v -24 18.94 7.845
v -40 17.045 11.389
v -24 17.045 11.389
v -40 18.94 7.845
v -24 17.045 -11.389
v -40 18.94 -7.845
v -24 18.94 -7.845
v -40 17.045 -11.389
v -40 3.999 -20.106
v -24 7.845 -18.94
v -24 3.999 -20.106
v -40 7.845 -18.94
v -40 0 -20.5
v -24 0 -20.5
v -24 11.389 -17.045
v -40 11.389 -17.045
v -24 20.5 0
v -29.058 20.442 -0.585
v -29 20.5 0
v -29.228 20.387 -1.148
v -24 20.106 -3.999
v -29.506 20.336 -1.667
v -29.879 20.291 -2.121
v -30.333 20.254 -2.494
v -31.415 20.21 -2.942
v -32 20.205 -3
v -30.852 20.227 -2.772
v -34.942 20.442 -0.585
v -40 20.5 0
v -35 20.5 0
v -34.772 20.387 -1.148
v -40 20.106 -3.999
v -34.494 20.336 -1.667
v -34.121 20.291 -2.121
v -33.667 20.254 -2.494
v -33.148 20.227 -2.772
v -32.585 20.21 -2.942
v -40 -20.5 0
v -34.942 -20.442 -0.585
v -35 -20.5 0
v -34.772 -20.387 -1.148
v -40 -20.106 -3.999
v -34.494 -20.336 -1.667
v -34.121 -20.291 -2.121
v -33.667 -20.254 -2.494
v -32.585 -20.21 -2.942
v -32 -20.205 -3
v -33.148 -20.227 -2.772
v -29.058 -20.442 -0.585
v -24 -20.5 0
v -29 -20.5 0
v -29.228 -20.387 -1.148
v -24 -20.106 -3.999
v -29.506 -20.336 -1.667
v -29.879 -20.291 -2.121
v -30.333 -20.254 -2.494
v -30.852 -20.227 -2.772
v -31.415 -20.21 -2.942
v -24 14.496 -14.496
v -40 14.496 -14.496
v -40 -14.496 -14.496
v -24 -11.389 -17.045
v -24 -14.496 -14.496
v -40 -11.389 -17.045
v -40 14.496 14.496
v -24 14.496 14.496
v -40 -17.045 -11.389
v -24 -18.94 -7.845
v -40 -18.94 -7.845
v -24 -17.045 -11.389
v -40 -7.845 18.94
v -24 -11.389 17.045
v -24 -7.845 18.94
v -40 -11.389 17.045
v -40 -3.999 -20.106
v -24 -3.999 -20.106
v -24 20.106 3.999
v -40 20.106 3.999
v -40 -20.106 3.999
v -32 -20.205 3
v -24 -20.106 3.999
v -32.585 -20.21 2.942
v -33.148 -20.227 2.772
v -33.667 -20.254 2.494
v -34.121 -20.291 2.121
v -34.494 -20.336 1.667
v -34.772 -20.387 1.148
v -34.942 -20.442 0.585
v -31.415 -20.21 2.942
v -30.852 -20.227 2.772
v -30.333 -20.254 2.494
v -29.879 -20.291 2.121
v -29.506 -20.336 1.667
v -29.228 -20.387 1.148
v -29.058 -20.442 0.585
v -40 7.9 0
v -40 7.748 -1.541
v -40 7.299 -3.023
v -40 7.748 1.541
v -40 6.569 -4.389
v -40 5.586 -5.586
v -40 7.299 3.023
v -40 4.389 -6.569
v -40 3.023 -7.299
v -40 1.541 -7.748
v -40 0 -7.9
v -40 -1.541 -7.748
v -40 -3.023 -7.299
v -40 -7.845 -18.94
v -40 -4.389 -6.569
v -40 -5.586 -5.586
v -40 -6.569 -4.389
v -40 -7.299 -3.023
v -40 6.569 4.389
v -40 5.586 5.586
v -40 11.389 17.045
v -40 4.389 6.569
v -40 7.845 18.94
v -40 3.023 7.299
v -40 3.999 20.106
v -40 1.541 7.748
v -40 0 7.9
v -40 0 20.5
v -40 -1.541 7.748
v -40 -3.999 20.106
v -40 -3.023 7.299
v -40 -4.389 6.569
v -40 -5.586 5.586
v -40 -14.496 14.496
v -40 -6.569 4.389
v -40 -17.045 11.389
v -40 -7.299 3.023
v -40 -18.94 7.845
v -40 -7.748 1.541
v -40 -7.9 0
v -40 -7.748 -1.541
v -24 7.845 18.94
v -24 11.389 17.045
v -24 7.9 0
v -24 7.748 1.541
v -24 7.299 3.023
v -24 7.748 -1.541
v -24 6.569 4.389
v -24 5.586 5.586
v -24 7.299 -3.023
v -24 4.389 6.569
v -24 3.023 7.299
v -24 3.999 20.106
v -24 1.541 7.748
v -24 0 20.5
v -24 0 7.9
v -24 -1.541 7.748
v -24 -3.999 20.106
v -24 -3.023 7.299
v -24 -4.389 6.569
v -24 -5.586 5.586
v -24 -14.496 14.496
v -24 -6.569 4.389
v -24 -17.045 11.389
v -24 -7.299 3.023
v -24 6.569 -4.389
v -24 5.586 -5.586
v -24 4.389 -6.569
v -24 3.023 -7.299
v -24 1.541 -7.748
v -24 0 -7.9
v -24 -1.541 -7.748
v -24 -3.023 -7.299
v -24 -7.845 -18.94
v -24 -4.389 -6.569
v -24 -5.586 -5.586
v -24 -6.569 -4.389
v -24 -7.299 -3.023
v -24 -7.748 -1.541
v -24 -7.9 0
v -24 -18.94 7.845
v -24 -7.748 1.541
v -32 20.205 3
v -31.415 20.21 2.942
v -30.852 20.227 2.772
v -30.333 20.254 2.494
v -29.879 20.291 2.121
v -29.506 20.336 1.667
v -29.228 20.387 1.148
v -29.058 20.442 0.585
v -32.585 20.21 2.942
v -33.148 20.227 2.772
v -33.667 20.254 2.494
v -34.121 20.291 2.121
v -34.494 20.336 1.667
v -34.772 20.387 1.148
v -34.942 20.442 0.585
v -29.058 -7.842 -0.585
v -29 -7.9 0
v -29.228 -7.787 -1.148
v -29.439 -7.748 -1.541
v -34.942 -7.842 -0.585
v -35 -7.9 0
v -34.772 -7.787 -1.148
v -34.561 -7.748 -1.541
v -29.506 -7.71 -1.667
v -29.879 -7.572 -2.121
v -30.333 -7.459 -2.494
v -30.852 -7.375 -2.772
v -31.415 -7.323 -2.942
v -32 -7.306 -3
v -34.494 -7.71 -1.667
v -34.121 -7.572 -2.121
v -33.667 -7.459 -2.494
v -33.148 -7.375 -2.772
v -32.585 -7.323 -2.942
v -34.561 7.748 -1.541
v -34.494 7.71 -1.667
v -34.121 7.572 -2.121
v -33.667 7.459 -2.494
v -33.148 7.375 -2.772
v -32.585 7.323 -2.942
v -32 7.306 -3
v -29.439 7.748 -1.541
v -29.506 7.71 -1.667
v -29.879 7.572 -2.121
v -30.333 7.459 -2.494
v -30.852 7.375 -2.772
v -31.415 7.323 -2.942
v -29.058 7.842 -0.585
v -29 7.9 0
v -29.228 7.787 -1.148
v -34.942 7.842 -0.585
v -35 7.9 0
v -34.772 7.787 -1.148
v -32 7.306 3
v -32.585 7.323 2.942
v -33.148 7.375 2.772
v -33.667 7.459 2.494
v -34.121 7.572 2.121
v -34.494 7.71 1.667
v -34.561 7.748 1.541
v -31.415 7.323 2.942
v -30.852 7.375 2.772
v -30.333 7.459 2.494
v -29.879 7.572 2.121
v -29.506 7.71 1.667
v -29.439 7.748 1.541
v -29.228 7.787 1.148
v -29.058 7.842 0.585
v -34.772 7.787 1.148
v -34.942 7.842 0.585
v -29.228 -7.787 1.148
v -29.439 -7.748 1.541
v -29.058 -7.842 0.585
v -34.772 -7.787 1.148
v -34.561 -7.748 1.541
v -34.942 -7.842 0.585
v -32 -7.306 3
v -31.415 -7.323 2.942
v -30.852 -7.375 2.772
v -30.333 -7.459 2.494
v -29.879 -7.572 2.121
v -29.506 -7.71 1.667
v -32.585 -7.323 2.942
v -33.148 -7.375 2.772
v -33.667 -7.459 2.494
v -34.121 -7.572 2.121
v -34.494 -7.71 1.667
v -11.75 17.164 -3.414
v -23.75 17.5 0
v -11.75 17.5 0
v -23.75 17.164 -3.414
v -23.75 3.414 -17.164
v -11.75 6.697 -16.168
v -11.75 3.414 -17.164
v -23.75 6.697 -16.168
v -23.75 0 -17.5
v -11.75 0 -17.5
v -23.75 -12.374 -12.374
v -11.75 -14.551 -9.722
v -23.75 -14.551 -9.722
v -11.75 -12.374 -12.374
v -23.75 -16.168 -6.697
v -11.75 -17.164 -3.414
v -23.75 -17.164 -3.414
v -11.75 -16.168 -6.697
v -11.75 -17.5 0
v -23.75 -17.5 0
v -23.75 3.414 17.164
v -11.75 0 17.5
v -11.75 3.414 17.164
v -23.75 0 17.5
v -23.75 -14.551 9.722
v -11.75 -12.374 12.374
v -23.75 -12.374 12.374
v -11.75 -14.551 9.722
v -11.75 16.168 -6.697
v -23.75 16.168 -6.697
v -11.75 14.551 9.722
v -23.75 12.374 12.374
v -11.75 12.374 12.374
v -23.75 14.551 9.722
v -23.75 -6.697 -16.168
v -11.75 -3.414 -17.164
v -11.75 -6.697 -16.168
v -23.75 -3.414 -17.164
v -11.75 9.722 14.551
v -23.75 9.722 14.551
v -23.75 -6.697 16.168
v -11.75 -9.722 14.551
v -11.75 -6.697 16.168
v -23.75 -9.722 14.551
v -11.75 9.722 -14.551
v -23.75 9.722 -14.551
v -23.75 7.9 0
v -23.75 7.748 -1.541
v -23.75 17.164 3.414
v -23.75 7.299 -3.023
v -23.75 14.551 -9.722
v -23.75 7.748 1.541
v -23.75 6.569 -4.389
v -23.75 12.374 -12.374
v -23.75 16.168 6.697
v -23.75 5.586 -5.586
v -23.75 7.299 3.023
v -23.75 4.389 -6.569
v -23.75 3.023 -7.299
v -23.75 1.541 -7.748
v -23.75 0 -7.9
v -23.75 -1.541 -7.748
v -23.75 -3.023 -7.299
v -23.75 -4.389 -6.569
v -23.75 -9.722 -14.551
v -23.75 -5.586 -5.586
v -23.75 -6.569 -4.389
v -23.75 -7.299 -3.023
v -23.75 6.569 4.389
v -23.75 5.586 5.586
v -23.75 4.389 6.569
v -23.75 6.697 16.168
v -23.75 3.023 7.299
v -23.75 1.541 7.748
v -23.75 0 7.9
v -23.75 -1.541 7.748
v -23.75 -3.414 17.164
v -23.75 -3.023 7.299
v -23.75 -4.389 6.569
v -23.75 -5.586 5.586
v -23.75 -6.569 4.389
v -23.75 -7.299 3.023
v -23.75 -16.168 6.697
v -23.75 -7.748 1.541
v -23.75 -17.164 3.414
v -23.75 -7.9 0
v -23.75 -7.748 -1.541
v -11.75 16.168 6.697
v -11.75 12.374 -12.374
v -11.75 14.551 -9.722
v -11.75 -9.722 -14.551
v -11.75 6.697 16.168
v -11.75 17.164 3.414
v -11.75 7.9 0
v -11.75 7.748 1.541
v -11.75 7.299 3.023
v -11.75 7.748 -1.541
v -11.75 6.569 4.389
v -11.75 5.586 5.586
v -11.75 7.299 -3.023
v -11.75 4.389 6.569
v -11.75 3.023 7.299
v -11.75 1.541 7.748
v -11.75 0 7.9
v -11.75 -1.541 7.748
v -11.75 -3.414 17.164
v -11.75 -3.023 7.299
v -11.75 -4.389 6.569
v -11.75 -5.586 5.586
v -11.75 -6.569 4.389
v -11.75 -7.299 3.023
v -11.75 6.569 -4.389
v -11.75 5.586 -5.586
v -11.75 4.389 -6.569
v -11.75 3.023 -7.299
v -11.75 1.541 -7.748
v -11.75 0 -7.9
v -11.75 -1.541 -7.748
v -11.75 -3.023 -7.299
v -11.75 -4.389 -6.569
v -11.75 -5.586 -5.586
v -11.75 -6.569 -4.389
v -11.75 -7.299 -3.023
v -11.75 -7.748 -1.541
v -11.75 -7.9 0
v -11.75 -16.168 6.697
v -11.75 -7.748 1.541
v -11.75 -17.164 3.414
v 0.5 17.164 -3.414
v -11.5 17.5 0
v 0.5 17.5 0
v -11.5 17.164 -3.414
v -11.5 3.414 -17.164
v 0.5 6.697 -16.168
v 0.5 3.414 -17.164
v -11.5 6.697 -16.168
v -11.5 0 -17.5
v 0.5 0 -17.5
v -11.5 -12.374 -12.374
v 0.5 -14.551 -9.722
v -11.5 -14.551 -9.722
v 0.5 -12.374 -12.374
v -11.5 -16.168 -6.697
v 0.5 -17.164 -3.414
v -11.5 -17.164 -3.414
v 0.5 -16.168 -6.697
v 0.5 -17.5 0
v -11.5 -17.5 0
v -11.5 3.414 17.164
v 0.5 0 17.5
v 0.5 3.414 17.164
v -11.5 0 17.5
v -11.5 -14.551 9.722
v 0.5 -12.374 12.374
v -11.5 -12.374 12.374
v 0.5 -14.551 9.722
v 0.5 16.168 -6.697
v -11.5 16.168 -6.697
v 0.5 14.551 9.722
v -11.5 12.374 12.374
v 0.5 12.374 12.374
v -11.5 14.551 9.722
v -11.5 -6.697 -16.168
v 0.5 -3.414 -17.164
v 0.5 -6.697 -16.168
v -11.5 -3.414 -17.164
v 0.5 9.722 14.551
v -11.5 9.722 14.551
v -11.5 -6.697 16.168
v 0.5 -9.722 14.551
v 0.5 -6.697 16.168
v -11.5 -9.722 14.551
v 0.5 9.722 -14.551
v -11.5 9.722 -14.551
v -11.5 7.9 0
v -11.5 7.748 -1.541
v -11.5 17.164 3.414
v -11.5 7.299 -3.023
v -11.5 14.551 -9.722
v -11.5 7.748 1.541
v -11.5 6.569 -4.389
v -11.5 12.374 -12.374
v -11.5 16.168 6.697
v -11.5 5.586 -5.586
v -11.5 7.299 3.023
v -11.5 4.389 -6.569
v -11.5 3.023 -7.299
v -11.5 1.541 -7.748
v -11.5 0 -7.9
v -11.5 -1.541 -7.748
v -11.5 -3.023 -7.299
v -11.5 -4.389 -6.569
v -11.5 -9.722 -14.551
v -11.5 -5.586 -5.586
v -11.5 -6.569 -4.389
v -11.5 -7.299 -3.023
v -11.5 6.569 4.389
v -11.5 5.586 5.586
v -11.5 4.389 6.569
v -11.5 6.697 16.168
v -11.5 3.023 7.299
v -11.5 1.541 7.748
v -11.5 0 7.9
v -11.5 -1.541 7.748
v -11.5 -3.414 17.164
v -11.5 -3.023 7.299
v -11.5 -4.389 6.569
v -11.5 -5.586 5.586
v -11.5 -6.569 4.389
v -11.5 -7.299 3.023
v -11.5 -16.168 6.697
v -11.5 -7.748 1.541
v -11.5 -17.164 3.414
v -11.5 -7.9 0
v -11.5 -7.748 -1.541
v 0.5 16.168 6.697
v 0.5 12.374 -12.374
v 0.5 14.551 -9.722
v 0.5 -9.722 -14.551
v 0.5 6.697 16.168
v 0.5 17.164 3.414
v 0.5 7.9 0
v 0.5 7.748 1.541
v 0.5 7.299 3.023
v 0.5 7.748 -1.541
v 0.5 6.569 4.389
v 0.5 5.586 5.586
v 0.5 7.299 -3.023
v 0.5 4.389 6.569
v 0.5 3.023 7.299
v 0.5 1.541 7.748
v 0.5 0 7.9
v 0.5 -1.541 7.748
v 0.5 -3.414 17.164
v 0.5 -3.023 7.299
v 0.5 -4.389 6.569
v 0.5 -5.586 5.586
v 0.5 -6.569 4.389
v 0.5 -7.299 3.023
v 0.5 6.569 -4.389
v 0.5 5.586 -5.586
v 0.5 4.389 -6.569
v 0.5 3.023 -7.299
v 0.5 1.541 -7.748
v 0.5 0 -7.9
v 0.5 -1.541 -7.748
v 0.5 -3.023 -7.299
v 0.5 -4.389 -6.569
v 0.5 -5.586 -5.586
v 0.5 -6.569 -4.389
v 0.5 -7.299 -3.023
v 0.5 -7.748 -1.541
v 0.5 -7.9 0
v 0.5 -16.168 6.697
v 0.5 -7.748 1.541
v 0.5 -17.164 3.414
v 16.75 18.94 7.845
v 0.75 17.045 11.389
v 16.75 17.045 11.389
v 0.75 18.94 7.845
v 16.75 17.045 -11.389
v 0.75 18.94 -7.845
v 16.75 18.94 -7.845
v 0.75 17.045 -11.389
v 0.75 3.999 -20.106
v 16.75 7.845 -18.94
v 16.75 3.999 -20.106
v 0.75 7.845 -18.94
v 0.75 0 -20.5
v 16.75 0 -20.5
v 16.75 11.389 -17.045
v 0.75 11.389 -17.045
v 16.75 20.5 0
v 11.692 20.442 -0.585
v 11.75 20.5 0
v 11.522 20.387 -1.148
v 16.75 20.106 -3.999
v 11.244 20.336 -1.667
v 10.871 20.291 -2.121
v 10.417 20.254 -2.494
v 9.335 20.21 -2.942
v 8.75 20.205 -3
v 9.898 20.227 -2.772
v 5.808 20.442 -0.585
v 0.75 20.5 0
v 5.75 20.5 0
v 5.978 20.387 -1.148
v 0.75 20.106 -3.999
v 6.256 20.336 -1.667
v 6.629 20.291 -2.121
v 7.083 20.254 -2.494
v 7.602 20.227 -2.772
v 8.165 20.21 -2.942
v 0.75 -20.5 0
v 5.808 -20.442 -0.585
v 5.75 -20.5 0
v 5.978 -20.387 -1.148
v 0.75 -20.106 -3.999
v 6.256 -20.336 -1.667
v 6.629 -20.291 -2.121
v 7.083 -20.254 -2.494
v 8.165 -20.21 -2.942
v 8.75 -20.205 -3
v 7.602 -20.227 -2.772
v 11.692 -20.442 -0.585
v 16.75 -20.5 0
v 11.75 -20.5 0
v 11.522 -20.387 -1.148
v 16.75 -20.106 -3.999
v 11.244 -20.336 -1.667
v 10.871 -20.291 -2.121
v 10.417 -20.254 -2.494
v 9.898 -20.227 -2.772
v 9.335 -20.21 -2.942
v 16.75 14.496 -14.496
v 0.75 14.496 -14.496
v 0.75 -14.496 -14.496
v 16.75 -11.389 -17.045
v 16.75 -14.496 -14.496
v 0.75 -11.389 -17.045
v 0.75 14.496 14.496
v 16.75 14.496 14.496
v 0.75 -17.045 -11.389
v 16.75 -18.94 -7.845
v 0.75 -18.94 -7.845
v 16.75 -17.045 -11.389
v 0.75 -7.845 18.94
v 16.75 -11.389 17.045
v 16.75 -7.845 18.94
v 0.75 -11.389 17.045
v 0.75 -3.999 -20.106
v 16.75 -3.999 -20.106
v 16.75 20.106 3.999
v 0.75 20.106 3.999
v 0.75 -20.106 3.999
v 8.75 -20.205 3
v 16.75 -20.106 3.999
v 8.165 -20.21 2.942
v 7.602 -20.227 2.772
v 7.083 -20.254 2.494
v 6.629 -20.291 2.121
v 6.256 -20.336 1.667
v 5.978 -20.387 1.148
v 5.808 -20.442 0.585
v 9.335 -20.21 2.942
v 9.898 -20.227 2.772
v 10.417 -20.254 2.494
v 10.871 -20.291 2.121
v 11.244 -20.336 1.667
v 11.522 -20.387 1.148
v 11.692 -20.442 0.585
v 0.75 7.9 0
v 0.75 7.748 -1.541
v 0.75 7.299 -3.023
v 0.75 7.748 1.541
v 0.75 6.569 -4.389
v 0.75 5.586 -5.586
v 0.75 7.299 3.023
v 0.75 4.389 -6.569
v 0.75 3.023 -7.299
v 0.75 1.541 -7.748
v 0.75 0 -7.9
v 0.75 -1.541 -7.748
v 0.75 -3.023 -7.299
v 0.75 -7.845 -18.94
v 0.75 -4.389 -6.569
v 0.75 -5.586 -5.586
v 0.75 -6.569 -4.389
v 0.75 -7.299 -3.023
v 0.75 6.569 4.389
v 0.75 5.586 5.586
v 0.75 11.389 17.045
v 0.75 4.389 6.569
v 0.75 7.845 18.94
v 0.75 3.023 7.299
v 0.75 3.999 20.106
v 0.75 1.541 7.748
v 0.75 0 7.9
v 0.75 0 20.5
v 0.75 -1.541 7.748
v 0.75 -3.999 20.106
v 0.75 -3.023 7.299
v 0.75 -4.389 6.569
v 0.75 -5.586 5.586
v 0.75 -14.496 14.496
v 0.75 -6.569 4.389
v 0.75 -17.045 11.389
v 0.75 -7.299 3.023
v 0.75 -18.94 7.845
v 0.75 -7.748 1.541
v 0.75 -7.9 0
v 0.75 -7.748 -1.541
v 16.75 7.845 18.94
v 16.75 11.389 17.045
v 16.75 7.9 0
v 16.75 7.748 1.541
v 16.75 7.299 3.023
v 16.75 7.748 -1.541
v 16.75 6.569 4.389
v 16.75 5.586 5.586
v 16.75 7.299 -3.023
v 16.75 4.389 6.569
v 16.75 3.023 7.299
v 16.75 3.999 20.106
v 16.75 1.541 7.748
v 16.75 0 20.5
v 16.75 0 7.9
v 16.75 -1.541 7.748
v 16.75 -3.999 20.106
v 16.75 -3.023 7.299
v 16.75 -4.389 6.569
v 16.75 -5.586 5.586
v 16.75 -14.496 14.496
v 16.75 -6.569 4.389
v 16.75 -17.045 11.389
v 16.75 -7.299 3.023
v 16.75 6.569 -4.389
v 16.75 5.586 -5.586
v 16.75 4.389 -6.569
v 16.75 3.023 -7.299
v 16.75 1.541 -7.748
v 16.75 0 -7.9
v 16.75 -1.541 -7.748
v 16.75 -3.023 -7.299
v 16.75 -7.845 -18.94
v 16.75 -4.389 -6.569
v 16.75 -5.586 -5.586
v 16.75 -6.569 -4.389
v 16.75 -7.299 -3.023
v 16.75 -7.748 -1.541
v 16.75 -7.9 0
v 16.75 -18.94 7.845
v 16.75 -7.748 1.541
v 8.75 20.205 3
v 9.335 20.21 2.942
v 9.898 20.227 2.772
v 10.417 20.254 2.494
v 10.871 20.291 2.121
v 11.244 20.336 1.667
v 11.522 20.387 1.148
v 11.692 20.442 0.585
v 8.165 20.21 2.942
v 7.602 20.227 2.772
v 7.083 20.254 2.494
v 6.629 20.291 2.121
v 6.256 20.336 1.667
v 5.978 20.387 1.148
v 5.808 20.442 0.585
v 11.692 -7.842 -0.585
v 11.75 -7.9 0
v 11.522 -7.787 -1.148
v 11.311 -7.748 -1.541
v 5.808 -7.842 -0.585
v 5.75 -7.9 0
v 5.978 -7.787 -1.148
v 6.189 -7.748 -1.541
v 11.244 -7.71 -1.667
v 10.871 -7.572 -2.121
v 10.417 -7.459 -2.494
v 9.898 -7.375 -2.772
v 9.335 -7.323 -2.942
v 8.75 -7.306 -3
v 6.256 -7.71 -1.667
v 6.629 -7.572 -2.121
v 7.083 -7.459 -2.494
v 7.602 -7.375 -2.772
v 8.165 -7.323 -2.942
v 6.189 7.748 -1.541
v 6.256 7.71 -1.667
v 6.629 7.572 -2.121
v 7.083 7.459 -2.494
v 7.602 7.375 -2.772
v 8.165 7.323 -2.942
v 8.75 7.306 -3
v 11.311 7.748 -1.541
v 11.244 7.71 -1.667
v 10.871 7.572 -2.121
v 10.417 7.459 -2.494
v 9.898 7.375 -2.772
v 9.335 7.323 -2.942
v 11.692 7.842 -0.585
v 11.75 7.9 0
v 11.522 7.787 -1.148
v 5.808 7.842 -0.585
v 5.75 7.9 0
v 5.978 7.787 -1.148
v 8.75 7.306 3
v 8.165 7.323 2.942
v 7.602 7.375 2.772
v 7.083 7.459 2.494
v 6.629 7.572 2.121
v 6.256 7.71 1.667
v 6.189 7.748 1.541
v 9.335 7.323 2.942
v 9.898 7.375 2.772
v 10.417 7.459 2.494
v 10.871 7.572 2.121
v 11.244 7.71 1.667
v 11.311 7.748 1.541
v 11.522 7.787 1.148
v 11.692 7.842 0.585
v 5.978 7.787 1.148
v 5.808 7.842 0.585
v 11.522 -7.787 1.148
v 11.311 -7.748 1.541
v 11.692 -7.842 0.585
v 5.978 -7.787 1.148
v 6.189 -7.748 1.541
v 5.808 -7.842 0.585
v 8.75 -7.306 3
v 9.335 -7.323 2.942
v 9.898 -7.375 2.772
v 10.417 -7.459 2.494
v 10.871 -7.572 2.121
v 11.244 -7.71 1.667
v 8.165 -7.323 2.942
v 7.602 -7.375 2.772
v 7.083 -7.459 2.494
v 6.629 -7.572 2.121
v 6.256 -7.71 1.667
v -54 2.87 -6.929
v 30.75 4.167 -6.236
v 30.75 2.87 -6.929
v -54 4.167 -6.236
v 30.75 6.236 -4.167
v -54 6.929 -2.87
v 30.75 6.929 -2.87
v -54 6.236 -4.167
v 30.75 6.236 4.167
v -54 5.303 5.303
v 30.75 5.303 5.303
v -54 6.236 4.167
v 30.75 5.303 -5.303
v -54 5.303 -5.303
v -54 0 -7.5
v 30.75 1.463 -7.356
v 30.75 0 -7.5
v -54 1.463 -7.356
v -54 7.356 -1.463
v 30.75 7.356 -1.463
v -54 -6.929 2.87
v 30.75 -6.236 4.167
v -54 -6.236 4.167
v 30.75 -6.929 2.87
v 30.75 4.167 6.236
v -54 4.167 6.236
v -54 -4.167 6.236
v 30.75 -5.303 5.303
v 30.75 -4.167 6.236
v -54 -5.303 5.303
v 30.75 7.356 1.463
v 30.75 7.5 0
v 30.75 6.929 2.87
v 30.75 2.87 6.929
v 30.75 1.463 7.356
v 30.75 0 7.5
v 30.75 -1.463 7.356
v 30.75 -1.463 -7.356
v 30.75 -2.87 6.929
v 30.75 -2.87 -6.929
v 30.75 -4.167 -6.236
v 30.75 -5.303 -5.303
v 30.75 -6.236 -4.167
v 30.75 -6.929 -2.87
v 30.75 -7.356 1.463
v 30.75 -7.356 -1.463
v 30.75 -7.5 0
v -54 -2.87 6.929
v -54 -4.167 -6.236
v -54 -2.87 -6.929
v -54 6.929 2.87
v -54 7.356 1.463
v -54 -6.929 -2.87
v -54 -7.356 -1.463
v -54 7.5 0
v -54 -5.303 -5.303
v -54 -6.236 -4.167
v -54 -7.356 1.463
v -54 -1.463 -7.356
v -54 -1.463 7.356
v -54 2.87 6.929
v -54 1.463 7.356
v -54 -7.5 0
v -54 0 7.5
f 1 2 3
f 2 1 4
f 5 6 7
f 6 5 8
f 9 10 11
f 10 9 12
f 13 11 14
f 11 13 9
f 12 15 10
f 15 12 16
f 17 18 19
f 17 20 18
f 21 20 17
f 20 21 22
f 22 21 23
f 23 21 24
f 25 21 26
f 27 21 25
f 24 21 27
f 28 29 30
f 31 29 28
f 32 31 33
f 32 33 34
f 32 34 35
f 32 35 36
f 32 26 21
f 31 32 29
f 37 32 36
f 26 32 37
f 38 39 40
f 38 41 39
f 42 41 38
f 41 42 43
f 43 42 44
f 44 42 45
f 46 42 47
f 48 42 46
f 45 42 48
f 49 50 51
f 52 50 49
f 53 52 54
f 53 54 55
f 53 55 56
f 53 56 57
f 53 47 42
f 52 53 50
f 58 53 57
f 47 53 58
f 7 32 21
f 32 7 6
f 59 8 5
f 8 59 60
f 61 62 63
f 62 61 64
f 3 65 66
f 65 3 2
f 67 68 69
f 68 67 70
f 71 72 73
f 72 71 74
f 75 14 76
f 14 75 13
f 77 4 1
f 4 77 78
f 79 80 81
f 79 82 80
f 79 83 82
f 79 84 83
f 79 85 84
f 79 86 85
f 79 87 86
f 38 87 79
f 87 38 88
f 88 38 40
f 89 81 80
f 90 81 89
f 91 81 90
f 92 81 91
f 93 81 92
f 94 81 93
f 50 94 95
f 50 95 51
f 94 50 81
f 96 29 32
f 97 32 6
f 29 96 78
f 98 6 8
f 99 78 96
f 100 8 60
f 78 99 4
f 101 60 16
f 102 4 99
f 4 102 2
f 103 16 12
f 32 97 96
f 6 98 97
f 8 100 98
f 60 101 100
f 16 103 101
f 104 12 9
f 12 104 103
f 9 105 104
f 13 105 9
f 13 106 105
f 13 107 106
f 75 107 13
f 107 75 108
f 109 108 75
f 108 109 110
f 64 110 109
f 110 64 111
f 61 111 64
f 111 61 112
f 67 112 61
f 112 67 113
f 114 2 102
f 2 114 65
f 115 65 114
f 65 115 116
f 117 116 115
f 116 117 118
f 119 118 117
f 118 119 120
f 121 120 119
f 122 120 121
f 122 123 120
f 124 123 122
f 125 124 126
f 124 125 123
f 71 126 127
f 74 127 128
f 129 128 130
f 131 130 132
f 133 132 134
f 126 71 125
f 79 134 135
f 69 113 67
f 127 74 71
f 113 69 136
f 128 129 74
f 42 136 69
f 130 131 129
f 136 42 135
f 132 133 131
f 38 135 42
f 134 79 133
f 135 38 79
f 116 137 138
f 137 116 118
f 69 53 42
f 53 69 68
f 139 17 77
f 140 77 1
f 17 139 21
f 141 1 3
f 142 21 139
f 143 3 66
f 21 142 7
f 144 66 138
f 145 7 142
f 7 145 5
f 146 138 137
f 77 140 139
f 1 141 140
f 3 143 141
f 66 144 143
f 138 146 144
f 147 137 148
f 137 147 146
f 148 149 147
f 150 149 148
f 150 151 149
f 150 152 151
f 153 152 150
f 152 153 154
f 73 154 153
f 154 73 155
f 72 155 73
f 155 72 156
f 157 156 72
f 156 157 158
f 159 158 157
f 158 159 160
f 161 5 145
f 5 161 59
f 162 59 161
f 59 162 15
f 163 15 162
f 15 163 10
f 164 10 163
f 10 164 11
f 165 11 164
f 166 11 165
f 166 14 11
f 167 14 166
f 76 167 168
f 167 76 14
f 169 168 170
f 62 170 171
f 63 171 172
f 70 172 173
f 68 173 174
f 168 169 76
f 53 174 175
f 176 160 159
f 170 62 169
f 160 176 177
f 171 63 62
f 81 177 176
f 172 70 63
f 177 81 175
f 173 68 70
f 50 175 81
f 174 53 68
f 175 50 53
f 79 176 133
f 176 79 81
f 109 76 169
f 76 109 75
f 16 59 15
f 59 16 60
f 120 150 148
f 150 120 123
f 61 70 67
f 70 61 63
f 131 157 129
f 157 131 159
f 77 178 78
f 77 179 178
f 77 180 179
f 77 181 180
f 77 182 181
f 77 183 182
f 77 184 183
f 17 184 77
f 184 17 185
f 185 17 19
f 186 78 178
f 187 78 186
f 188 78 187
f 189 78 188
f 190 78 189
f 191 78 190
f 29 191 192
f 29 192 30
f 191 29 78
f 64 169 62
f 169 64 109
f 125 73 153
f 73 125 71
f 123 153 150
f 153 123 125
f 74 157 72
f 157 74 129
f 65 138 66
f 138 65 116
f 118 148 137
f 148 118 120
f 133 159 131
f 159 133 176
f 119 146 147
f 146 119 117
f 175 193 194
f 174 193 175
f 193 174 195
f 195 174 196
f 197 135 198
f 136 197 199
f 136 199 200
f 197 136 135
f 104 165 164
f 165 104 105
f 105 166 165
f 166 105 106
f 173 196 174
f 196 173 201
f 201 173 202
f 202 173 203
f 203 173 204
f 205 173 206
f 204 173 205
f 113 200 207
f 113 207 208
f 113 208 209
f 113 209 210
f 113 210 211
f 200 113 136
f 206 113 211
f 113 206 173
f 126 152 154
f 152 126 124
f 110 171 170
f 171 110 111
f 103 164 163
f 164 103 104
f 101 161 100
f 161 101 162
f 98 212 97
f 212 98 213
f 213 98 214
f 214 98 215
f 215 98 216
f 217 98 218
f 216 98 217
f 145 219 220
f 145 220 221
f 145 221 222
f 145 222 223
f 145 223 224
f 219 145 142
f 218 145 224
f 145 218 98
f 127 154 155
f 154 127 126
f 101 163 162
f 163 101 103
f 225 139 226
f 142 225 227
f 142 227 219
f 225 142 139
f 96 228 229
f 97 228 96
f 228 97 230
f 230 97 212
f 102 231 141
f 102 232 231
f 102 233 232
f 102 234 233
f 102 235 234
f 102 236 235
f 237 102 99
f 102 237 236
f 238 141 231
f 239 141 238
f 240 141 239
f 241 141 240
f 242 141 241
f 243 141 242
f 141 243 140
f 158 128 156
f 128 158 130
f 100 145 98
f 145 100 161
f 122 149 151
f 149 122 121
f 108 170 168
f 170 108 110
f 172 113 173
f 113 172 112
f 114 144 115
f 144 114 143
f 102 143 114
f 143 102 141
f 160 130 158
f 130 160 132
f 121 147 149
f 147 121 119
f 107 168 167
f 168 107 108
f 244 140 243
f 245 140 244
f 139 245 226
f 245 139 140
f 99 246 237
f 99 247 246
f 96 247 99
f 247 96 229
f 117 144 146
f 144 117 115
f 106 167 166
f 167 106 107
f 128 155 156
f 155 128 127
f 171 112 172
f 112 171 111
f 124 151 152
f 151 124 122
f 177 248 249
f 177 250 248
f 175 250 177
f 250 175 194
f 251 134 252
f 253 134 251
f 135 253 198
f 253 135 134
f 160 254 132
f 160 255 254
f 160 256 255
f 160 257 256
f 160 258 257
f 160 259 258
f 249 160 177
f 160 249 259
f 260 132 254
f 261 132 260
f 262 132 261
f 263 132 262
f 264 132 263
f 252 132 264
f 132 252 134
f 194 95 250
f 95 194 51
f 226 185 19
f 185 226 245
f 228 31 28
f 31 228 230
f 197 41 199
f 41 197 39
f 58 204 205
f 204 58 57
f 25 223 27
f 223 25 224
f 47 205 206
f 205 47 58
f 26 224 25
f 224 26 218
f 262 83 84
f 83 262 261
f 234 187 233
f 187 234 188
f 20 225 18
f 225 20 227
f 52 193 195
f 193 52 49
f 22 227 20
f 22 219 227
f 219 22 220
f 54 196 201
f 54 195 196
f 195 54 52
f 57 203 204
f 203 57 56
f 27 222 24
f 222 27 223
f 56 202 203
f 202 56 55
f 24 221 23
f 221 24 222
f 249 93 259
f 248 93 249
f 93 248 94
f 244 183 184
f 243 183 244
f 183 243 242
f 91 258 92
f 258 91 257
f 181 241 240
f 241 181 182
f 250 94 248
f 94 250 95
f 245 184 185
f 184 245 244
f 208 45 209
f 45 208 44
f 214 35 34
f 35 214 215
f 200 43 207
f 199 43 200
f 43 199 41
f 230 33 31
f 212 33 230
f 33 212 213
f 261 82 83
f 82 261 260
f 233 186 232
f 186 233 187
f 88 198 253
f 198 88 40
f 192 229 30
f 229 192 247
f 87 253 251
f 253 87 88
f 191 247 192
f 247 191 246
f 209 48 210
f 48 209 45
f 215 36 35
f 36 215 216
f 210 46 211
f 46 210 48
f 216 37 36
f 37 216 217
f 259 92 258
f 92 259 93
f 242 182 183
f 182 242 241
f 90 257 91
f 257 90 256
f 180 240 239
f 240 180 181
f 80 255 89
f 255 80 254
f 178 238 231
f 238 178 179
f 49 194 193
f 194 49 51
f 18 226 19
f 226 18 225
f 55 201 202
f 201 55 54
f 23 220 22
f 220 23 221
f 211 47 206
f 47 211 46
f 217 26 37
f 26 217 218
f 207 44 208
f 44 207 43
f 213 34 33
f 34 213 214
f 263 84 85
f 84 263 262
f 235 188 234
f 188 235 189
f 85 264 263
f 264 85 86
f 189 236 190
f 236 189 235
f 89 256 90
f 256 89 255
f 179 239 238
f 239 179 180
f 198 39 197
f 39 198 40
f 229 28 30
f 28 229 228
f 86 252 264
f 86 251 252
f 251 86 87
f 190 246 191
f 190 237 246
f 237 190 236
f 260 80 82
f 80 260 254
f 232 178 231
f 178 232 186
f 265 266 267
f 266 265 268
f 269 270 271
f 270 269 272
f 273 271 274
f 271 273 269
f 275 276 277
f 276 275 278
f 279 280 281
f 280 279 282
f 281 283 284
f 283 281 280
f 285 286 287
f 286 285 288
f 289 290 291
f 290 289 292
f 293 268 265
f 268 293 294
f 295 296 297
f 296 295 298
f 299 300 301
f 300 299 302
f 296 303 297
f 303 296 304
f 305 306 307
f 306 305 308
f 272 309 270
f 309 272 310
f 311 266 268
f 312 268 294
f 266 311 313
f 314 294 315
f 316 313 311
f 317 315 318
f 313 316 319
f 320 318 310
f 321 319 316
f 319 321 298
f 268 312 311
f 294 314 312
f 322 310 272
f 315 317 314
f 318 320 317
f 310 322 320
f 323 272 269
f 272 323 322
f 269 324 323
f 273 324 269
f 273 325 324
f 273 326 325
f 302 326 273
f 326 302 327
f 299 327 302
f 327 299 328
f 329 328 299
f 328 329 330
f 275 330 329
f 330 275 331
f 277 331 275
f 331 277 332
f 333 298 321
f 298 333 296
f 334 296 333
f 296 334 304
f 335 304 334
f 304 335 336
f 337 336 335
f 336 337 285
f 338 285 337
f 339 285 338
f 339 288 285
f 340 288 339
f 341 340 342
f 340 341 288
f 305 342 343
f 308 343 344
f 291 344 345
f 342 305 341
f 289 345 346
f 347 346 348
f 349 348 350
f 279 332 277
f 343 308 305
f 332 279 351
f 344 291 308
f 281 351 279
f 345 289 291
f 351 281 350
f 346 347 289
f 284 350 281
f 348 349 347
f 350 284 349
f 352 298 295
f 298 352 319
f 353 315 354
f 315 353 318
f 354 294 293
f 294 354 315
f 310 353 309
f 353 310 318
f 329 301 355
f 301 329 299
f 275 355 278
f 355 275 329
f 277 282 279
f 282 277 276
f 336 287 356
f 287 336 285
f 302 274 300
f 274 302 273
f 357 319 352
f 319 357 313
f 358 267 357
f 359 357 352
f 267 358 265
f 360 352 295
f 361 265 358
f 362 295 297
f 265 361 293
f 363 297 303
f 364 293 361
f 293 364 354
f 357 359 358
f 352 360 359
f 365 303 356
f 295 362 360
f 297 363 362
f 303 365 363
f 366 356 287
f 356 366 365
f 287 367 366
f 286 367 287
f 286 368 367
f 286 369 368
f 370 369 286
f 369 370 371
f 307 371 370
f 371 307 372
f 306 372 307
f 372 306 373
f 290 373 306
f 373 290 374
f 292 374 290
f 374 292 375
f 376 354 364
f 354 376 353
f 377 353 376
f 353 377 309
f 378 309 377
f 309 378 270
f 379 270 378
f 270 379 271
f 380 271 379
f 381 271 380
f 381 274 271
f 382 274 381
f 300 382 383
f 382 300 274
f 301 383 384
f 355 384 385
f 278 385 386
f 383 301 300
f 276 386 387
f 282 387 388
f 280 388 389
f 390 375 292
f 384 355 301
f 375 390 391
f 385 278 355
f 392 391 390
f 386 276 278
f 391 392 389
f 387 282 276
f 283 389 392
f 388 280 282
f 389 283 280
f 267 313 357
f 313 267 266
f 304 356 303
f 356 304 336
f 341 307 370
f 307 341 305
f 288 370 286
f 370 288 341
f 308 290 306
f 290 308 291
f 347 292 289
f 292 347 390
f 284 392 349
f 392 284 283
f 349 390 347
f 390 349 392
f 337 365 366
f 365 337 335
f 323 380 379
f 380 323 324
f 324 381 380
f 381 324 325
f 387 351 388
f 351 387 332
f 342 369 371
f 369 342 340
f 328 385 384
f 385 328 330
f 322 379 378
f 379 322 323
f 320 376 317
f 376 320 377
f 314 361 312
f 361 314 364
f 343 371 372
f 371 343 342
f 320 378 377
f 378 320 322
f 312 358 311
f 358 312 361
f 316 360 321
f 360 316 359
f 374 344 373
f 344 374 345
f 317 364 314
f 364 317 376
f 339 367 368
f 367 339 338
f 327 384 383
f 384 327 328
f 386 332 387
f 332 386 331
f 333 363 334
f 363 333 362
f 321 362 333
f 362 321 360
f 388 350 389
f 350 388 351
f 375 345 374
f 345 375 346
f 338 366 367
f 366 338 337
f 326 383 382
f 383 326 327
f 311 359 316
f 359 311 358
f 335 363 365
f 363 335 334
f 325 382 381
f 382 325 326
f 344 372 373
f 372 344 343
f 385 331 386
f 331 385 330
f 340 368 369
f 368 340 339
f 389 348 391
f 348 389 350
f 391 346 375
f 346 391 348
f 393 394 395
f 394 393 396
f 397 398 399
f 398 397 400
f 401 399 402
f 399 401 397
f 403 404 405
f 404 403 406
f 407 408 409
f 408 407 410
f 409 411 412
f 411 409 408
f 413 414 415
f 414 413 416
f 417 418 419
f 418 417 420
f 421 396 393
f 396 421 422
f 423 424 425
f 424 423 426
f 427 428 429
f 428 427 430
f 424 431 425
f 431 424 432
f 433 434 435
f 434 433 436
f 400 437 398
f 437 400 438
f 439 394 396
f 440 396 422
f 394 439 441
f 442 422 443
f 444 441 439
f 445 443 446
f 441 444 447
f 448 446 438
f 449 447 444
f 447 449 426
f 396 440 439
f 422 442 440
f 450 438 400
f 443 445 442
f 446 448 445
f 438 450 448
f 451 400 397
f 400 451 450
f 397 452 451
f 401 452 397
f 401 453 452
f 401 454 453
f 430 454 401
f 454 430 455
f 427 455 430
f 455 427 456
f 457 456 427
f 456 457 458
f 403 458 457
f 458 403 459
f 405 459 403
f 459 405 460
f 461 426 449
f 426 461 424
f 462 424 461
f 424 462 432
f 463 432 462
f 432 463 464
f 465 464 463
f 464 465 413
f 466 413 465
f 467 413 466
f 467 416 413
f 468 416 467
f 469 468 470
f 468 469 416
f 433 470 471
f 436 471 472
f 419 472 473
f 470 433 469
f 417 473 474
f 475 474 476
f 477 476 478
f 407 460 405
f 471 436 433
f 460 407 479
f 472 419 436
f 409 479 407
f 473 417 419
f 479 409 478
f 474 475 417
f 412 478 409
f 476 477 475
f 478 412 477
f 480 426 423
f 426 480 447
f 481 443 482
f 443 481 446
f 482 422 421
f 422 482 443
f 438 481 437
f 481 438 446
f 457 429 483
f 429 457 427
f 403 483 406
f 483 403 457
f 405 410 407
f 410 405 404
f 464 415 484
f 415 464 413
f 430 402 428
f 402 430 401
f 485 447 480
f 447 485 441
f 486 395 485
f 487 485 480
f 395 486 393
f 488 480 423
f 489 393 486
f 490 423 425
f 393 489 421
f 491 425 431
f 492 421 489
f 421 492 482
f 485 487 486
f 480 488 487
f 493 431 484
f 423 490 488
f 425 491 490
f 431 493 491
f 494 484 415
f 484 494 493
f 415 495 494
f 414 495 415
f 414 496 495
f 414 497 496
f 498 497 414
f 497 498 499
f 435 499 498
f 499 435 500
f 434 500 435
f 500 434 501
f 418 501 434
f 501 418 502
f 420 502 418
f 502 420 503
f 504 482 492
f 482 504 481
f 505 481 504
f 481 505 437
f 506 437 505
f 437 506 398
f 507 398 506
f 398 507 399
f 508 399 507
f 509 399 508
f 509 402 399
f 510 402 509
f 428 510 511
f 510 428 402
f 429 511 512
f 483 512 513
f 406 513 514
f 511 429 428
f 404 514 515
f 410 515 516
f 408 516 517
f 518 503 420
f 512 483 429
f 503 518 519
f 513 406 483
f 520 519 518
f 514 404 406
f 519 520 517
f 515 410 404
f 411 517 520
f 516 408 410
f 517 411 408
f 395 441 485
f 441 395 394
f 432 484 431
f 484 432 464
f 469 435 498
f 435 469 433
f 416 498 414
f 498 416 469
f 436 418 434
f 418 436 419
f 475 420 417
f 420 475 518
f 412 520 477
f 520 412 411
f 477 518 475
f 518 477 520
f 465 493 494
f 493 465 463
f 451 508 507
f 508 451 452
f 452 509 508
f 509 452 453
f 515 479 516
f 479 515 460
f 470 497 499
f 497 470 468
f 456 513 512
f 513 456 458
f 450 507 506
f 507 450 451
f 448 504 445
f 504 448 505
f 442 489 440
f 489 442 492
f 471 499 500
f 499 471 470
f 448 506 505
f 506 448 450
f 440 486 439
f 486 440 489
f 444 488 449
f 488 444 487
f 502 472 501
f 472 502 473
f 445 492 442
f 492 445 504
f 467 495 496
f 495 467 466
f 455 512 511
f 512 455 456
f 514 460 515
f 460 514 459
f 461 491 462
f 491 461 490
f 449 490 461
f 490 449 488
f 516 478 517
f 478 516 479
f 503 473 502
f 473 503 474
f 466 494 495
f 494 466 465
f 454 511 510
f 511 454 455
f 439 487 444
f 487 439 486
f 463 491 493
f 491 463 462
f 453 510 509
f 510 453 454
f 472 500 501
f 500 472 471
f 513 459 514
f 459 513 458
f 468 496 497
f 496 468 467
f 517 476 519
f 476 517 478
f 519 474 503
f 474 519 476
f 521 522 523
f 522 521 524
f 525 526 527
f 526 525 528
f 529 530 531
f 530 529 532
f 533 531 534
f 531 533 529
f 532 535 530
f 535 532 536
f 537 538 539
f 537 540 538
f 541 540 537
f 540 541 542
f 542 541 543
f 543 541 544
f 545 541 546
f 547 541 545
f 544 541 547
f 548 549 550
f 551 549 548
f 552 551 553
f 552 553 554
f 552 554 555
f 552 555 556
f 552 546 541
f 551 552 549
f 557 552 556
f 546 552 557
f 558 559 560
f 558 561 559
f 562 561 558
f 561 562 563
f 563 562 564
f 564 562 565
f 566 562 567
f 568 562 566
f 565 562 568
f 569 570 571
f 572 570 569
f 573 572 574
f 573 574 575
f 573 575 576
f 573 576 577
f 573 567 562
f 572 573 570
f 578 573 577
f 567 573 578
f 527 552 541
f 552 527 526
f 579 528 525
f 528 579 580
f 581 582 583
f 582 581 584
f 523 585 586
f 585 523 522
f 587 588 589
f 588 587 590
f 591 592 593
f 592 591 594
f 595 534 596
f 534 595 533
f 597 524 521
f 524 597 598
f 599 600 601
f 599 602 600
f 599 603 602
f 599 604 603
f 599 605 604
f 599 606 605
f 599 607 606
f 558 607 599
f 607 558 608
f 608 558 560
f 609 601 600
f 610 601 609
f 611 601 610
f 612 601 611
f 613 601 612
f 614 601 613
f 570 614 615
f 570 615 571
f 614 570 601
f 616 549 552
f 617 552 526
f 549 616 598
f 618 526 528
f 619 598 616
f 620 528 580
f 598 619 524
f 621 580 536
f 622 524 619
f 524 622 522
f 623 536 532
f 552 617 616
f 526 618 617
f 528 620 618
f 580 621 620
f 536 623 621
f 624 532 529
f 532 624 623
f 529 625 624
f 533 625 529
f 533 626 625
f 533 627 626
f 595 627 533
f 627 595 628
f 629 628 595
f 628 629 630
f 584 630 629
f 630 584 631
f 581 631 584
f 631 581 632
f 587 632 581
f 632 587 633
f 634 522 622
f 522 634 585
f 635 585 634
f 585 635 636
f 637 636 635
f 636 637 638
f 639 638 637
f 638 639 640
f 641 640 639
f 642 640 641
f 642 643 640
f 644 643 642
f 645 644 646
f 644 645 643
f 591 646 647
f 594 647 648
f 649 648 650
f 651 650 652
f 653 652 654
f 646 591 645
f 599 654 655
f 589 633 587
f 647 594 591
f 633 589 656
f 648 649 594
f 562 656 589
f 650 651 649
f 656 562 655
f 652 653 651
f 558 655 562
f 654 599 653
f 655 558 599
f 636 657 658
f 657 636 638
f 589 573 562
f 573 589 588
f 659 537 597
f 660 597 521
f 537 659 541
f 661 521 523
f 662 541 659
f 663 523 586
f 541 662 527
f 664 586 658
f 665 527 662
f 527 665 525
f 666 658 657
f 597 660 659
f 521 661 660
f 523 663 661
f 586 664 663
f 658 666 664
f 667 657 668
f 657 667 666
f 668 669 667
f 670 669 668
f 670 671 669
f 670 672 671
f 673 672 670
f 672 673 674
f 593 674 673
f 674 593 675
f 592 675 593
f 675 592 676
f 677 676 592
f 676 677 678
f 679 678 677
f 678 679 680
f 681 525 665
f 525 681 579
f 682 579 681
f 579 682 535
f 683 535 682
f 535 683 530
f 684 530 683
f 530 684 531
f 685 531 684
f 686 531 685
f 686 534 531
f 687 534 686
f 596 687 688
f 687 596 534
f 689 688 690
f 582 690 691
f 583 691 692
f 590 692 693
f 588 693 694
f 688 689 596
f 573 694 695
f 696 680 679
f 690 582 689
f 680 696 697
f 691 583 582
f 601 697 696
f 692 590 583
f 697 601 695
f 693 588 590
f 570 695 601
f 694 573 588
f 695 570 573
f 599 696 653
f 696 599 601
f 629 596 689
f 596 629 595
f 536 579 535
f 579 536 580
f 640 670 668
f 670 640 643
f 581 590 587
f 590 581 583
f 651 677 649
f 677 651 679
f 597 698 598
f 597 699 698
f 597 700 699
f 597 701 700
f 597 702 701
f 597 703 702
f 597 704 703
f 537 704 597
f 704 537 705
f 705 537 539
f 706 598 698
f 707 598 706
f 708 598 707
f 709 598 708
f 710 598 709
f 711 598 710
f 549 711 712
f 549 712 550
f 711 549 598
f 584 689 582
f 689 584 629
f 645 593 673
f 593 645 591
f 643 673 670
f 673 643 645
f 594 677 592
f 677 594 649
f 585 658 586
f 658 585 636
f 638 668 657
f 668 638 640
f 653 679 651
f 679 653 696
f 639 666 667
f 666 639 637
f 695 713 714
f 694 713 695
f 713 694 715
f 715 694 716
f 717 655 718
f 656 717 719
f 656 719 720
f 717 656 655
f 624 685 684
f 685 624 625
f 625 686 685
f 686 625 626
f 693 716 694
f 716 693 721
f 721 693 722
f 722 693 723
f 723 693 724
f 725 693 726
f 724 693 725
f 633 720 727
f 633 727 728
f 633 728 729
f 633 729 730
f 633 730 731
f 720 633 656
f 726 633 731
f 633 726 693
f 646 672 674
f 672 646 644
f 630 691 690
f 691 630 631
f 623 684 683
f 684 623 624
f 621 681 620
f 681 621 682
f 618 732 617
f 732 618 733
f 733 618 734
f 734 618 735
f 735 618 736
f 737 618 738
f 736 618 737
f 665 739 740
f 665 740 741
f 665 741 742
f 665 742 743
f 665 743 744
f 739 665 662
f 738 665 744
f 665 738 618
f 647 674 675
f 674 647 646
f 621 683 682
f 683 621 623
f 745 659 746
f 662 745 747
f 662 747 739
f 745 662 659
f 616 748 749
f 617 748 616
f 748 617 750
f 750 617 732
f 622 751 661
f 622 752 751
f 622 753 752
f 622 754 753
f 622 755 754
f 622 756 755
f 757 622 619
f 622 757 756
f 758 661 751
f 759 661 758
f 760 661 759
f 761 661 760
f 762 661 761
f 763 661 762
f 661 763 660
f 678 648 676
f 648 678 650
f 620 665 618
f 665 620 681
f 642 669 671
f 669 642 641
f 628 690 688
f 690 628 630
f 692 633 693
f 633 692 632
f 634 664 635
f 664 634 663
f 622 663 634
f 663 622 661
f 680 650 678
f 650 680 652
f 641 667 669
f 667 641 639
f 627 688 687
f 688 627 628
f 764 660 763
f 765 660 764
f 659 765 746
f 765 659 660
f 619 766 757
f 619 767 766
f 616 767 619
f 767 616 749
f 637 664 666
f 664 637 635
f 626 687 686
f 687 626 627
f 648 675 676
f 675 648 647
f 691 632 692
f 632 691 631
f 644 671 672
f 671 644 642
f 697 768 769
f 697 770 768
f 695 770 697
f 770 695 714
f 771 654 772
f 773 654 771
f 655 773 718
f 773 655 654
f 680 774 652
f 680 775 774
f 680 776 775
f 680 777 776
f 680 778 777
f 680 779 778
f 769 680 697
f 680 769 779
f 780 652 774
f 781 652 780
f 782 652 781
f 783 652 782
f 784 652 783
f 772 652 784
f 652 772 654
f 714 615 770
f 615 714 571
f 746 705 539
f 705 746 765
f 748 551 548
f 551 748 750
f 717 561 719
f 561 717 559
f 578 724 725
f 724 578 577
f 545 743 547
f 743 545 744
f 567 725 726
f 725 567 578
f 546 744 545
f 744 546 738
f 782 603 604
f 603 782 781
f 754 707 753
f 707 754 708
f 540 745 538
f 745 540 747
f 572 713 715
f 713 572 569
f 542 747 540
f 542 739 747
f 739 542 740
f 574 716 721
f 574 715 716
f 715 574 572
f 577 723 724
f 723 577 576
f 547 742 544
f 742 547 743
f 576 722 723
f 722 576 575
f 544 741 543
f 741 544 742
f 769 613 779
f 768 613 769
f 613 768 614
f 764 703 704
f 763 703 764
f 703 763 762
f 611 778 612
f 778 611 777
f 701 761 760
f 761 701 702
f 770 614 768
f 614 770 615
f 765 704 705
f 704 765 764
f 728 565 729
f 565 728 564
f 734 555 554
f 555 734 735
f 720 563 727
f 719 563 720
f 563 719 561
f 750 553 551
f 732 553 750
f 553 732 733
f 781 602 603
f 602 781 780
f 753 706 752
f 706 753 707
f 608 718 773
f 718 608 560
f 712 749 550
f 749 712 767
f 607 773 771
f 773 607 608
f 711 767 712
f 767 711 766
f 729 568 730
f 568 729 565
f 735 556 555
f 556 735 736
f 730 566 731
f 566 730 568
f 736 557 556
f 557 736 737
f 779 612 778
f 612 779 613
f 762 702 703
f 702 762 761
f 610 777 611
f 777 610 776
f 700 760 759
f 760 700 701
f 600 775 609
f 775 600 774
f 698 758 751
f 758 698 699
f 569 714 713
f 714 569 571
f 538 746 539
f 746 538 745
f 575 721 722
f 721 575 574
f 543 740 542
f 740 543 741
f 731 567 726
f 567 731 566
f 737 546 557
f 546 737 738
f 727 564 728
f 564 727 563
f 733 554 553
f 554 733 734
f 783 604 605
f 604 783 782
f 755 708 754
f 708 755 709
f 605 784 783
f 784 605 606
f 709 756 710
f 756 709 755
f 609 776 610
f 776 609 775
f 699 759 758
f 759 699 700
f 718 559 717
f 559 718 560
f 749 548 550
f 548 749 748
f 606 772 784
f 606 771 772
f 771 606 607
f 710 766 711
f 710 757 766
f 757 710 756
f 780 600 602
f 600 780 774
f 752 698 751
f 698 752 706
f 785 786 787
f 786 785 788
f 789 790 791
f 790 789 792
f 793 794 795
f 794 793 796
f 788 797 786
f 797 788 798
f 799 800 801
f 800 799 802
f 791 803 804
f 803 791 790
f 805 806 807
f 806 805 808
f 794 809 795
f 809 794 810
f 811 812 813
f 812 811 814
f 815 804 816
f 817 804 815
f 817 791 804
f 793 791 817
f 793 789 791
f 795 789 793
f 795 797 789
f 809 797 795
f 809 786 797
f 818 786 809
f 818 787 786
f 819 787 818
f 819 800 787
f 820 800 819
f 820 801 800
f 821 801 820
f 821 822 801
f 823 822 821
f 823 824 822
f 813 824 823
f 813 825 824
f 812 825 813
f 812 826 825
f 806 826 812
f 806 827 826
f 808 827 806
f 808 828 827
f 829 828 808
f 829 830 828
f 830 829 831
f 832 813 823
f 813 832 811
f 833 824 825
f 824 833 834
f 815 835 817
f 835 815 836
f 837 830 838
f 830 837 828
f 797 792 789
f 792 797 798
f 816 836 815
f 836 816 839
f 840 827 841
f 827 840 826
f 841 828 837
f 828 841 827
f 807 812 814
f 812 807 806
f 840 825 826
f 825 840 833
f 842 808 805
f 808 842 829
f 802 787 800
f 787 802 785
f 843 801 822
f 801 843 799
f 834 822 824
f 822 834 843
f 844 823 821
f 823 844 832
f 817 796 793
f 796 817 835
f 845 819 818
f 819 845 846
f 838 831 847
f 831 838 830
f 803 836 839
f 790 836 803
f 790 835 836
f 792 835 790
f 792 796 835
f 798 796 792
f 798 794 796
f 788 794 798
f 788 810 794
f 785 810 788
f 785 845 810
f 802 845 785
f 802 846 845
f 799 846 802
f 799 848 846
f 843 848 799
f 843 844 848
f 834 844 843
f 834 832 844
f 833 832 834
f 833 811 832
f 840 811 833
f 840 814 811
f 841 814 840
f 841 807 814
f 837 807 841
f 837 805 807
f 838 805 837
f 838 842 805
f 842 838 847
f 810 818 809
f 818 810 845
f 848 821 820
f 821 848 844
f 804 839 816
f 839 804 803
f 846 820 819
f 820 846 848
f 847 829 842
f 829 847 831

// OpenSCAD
$fn = 32;

// ------------------------------------------------------------------------
// Shaft with rings and collars: d15 shaft, 4 rings
// Every part is its own module, assembly() places them once.
// ------------------------------------------------------------------------

// --- part 1 ---
module shaft() {
  translate([0, 0, -42.375]) cylinder(h = 84.75, d = 15);
}

// --- part 2 ---
module collar_a() {
  difference() {
    cylinder(h = 16, d = 41);
    translate([0, 0, -1]) cylinder(h = 18, d = 15.8);
    translate([0, 0, 8]) rotate([90, 0, 0]) cylinder(h = 43, d = 6, center = true);
  }
}

// --- part 3 ---
module spacer_a() {
  difference() {
      translate([0, 0, 0]) cylinder(h = 12, d = 35);
      translate([0, 0, -1]) cylinder(h = 14, d = 15.8);
    }
}

// --- part 4 ---
module spacer_b() {
  difference() {
      translate([0, 0, 0]) cylinder(h = 12, d = 35);
      translate([0, 0, -1]) cylinder(h = 14, d = 15.8);
    }
}

// --- part 5 ---
module collar_b() {
  difference() {
    cylinder(h = 16, d = 41);
    translate([0, 0, -1]) cylinder(h = 18, d = 15.8);
    translate([0, 0, 8]) rotate([90, 0, 0]) cylinder(h = 43, d = 6, center = true);
  }
}

// --- assembly ---
module assembly() {
  translate([-11.625, 0, 0]) rotate([0, 90, 0]) shaft();
  translate([-40, 0, 0]) rotate([0, 90, 0]) collar_a();
  translate([-23.75, 0, 0]) rotate([0, 90, 0]) spacer_a();
  translate([-11.5, 0, 0]) rotate([0, 90, 0]) spacer_b();
  translate([0.75, 0, 0]) rotate([0, 90, 0]) collar_b();
}

assembly();
